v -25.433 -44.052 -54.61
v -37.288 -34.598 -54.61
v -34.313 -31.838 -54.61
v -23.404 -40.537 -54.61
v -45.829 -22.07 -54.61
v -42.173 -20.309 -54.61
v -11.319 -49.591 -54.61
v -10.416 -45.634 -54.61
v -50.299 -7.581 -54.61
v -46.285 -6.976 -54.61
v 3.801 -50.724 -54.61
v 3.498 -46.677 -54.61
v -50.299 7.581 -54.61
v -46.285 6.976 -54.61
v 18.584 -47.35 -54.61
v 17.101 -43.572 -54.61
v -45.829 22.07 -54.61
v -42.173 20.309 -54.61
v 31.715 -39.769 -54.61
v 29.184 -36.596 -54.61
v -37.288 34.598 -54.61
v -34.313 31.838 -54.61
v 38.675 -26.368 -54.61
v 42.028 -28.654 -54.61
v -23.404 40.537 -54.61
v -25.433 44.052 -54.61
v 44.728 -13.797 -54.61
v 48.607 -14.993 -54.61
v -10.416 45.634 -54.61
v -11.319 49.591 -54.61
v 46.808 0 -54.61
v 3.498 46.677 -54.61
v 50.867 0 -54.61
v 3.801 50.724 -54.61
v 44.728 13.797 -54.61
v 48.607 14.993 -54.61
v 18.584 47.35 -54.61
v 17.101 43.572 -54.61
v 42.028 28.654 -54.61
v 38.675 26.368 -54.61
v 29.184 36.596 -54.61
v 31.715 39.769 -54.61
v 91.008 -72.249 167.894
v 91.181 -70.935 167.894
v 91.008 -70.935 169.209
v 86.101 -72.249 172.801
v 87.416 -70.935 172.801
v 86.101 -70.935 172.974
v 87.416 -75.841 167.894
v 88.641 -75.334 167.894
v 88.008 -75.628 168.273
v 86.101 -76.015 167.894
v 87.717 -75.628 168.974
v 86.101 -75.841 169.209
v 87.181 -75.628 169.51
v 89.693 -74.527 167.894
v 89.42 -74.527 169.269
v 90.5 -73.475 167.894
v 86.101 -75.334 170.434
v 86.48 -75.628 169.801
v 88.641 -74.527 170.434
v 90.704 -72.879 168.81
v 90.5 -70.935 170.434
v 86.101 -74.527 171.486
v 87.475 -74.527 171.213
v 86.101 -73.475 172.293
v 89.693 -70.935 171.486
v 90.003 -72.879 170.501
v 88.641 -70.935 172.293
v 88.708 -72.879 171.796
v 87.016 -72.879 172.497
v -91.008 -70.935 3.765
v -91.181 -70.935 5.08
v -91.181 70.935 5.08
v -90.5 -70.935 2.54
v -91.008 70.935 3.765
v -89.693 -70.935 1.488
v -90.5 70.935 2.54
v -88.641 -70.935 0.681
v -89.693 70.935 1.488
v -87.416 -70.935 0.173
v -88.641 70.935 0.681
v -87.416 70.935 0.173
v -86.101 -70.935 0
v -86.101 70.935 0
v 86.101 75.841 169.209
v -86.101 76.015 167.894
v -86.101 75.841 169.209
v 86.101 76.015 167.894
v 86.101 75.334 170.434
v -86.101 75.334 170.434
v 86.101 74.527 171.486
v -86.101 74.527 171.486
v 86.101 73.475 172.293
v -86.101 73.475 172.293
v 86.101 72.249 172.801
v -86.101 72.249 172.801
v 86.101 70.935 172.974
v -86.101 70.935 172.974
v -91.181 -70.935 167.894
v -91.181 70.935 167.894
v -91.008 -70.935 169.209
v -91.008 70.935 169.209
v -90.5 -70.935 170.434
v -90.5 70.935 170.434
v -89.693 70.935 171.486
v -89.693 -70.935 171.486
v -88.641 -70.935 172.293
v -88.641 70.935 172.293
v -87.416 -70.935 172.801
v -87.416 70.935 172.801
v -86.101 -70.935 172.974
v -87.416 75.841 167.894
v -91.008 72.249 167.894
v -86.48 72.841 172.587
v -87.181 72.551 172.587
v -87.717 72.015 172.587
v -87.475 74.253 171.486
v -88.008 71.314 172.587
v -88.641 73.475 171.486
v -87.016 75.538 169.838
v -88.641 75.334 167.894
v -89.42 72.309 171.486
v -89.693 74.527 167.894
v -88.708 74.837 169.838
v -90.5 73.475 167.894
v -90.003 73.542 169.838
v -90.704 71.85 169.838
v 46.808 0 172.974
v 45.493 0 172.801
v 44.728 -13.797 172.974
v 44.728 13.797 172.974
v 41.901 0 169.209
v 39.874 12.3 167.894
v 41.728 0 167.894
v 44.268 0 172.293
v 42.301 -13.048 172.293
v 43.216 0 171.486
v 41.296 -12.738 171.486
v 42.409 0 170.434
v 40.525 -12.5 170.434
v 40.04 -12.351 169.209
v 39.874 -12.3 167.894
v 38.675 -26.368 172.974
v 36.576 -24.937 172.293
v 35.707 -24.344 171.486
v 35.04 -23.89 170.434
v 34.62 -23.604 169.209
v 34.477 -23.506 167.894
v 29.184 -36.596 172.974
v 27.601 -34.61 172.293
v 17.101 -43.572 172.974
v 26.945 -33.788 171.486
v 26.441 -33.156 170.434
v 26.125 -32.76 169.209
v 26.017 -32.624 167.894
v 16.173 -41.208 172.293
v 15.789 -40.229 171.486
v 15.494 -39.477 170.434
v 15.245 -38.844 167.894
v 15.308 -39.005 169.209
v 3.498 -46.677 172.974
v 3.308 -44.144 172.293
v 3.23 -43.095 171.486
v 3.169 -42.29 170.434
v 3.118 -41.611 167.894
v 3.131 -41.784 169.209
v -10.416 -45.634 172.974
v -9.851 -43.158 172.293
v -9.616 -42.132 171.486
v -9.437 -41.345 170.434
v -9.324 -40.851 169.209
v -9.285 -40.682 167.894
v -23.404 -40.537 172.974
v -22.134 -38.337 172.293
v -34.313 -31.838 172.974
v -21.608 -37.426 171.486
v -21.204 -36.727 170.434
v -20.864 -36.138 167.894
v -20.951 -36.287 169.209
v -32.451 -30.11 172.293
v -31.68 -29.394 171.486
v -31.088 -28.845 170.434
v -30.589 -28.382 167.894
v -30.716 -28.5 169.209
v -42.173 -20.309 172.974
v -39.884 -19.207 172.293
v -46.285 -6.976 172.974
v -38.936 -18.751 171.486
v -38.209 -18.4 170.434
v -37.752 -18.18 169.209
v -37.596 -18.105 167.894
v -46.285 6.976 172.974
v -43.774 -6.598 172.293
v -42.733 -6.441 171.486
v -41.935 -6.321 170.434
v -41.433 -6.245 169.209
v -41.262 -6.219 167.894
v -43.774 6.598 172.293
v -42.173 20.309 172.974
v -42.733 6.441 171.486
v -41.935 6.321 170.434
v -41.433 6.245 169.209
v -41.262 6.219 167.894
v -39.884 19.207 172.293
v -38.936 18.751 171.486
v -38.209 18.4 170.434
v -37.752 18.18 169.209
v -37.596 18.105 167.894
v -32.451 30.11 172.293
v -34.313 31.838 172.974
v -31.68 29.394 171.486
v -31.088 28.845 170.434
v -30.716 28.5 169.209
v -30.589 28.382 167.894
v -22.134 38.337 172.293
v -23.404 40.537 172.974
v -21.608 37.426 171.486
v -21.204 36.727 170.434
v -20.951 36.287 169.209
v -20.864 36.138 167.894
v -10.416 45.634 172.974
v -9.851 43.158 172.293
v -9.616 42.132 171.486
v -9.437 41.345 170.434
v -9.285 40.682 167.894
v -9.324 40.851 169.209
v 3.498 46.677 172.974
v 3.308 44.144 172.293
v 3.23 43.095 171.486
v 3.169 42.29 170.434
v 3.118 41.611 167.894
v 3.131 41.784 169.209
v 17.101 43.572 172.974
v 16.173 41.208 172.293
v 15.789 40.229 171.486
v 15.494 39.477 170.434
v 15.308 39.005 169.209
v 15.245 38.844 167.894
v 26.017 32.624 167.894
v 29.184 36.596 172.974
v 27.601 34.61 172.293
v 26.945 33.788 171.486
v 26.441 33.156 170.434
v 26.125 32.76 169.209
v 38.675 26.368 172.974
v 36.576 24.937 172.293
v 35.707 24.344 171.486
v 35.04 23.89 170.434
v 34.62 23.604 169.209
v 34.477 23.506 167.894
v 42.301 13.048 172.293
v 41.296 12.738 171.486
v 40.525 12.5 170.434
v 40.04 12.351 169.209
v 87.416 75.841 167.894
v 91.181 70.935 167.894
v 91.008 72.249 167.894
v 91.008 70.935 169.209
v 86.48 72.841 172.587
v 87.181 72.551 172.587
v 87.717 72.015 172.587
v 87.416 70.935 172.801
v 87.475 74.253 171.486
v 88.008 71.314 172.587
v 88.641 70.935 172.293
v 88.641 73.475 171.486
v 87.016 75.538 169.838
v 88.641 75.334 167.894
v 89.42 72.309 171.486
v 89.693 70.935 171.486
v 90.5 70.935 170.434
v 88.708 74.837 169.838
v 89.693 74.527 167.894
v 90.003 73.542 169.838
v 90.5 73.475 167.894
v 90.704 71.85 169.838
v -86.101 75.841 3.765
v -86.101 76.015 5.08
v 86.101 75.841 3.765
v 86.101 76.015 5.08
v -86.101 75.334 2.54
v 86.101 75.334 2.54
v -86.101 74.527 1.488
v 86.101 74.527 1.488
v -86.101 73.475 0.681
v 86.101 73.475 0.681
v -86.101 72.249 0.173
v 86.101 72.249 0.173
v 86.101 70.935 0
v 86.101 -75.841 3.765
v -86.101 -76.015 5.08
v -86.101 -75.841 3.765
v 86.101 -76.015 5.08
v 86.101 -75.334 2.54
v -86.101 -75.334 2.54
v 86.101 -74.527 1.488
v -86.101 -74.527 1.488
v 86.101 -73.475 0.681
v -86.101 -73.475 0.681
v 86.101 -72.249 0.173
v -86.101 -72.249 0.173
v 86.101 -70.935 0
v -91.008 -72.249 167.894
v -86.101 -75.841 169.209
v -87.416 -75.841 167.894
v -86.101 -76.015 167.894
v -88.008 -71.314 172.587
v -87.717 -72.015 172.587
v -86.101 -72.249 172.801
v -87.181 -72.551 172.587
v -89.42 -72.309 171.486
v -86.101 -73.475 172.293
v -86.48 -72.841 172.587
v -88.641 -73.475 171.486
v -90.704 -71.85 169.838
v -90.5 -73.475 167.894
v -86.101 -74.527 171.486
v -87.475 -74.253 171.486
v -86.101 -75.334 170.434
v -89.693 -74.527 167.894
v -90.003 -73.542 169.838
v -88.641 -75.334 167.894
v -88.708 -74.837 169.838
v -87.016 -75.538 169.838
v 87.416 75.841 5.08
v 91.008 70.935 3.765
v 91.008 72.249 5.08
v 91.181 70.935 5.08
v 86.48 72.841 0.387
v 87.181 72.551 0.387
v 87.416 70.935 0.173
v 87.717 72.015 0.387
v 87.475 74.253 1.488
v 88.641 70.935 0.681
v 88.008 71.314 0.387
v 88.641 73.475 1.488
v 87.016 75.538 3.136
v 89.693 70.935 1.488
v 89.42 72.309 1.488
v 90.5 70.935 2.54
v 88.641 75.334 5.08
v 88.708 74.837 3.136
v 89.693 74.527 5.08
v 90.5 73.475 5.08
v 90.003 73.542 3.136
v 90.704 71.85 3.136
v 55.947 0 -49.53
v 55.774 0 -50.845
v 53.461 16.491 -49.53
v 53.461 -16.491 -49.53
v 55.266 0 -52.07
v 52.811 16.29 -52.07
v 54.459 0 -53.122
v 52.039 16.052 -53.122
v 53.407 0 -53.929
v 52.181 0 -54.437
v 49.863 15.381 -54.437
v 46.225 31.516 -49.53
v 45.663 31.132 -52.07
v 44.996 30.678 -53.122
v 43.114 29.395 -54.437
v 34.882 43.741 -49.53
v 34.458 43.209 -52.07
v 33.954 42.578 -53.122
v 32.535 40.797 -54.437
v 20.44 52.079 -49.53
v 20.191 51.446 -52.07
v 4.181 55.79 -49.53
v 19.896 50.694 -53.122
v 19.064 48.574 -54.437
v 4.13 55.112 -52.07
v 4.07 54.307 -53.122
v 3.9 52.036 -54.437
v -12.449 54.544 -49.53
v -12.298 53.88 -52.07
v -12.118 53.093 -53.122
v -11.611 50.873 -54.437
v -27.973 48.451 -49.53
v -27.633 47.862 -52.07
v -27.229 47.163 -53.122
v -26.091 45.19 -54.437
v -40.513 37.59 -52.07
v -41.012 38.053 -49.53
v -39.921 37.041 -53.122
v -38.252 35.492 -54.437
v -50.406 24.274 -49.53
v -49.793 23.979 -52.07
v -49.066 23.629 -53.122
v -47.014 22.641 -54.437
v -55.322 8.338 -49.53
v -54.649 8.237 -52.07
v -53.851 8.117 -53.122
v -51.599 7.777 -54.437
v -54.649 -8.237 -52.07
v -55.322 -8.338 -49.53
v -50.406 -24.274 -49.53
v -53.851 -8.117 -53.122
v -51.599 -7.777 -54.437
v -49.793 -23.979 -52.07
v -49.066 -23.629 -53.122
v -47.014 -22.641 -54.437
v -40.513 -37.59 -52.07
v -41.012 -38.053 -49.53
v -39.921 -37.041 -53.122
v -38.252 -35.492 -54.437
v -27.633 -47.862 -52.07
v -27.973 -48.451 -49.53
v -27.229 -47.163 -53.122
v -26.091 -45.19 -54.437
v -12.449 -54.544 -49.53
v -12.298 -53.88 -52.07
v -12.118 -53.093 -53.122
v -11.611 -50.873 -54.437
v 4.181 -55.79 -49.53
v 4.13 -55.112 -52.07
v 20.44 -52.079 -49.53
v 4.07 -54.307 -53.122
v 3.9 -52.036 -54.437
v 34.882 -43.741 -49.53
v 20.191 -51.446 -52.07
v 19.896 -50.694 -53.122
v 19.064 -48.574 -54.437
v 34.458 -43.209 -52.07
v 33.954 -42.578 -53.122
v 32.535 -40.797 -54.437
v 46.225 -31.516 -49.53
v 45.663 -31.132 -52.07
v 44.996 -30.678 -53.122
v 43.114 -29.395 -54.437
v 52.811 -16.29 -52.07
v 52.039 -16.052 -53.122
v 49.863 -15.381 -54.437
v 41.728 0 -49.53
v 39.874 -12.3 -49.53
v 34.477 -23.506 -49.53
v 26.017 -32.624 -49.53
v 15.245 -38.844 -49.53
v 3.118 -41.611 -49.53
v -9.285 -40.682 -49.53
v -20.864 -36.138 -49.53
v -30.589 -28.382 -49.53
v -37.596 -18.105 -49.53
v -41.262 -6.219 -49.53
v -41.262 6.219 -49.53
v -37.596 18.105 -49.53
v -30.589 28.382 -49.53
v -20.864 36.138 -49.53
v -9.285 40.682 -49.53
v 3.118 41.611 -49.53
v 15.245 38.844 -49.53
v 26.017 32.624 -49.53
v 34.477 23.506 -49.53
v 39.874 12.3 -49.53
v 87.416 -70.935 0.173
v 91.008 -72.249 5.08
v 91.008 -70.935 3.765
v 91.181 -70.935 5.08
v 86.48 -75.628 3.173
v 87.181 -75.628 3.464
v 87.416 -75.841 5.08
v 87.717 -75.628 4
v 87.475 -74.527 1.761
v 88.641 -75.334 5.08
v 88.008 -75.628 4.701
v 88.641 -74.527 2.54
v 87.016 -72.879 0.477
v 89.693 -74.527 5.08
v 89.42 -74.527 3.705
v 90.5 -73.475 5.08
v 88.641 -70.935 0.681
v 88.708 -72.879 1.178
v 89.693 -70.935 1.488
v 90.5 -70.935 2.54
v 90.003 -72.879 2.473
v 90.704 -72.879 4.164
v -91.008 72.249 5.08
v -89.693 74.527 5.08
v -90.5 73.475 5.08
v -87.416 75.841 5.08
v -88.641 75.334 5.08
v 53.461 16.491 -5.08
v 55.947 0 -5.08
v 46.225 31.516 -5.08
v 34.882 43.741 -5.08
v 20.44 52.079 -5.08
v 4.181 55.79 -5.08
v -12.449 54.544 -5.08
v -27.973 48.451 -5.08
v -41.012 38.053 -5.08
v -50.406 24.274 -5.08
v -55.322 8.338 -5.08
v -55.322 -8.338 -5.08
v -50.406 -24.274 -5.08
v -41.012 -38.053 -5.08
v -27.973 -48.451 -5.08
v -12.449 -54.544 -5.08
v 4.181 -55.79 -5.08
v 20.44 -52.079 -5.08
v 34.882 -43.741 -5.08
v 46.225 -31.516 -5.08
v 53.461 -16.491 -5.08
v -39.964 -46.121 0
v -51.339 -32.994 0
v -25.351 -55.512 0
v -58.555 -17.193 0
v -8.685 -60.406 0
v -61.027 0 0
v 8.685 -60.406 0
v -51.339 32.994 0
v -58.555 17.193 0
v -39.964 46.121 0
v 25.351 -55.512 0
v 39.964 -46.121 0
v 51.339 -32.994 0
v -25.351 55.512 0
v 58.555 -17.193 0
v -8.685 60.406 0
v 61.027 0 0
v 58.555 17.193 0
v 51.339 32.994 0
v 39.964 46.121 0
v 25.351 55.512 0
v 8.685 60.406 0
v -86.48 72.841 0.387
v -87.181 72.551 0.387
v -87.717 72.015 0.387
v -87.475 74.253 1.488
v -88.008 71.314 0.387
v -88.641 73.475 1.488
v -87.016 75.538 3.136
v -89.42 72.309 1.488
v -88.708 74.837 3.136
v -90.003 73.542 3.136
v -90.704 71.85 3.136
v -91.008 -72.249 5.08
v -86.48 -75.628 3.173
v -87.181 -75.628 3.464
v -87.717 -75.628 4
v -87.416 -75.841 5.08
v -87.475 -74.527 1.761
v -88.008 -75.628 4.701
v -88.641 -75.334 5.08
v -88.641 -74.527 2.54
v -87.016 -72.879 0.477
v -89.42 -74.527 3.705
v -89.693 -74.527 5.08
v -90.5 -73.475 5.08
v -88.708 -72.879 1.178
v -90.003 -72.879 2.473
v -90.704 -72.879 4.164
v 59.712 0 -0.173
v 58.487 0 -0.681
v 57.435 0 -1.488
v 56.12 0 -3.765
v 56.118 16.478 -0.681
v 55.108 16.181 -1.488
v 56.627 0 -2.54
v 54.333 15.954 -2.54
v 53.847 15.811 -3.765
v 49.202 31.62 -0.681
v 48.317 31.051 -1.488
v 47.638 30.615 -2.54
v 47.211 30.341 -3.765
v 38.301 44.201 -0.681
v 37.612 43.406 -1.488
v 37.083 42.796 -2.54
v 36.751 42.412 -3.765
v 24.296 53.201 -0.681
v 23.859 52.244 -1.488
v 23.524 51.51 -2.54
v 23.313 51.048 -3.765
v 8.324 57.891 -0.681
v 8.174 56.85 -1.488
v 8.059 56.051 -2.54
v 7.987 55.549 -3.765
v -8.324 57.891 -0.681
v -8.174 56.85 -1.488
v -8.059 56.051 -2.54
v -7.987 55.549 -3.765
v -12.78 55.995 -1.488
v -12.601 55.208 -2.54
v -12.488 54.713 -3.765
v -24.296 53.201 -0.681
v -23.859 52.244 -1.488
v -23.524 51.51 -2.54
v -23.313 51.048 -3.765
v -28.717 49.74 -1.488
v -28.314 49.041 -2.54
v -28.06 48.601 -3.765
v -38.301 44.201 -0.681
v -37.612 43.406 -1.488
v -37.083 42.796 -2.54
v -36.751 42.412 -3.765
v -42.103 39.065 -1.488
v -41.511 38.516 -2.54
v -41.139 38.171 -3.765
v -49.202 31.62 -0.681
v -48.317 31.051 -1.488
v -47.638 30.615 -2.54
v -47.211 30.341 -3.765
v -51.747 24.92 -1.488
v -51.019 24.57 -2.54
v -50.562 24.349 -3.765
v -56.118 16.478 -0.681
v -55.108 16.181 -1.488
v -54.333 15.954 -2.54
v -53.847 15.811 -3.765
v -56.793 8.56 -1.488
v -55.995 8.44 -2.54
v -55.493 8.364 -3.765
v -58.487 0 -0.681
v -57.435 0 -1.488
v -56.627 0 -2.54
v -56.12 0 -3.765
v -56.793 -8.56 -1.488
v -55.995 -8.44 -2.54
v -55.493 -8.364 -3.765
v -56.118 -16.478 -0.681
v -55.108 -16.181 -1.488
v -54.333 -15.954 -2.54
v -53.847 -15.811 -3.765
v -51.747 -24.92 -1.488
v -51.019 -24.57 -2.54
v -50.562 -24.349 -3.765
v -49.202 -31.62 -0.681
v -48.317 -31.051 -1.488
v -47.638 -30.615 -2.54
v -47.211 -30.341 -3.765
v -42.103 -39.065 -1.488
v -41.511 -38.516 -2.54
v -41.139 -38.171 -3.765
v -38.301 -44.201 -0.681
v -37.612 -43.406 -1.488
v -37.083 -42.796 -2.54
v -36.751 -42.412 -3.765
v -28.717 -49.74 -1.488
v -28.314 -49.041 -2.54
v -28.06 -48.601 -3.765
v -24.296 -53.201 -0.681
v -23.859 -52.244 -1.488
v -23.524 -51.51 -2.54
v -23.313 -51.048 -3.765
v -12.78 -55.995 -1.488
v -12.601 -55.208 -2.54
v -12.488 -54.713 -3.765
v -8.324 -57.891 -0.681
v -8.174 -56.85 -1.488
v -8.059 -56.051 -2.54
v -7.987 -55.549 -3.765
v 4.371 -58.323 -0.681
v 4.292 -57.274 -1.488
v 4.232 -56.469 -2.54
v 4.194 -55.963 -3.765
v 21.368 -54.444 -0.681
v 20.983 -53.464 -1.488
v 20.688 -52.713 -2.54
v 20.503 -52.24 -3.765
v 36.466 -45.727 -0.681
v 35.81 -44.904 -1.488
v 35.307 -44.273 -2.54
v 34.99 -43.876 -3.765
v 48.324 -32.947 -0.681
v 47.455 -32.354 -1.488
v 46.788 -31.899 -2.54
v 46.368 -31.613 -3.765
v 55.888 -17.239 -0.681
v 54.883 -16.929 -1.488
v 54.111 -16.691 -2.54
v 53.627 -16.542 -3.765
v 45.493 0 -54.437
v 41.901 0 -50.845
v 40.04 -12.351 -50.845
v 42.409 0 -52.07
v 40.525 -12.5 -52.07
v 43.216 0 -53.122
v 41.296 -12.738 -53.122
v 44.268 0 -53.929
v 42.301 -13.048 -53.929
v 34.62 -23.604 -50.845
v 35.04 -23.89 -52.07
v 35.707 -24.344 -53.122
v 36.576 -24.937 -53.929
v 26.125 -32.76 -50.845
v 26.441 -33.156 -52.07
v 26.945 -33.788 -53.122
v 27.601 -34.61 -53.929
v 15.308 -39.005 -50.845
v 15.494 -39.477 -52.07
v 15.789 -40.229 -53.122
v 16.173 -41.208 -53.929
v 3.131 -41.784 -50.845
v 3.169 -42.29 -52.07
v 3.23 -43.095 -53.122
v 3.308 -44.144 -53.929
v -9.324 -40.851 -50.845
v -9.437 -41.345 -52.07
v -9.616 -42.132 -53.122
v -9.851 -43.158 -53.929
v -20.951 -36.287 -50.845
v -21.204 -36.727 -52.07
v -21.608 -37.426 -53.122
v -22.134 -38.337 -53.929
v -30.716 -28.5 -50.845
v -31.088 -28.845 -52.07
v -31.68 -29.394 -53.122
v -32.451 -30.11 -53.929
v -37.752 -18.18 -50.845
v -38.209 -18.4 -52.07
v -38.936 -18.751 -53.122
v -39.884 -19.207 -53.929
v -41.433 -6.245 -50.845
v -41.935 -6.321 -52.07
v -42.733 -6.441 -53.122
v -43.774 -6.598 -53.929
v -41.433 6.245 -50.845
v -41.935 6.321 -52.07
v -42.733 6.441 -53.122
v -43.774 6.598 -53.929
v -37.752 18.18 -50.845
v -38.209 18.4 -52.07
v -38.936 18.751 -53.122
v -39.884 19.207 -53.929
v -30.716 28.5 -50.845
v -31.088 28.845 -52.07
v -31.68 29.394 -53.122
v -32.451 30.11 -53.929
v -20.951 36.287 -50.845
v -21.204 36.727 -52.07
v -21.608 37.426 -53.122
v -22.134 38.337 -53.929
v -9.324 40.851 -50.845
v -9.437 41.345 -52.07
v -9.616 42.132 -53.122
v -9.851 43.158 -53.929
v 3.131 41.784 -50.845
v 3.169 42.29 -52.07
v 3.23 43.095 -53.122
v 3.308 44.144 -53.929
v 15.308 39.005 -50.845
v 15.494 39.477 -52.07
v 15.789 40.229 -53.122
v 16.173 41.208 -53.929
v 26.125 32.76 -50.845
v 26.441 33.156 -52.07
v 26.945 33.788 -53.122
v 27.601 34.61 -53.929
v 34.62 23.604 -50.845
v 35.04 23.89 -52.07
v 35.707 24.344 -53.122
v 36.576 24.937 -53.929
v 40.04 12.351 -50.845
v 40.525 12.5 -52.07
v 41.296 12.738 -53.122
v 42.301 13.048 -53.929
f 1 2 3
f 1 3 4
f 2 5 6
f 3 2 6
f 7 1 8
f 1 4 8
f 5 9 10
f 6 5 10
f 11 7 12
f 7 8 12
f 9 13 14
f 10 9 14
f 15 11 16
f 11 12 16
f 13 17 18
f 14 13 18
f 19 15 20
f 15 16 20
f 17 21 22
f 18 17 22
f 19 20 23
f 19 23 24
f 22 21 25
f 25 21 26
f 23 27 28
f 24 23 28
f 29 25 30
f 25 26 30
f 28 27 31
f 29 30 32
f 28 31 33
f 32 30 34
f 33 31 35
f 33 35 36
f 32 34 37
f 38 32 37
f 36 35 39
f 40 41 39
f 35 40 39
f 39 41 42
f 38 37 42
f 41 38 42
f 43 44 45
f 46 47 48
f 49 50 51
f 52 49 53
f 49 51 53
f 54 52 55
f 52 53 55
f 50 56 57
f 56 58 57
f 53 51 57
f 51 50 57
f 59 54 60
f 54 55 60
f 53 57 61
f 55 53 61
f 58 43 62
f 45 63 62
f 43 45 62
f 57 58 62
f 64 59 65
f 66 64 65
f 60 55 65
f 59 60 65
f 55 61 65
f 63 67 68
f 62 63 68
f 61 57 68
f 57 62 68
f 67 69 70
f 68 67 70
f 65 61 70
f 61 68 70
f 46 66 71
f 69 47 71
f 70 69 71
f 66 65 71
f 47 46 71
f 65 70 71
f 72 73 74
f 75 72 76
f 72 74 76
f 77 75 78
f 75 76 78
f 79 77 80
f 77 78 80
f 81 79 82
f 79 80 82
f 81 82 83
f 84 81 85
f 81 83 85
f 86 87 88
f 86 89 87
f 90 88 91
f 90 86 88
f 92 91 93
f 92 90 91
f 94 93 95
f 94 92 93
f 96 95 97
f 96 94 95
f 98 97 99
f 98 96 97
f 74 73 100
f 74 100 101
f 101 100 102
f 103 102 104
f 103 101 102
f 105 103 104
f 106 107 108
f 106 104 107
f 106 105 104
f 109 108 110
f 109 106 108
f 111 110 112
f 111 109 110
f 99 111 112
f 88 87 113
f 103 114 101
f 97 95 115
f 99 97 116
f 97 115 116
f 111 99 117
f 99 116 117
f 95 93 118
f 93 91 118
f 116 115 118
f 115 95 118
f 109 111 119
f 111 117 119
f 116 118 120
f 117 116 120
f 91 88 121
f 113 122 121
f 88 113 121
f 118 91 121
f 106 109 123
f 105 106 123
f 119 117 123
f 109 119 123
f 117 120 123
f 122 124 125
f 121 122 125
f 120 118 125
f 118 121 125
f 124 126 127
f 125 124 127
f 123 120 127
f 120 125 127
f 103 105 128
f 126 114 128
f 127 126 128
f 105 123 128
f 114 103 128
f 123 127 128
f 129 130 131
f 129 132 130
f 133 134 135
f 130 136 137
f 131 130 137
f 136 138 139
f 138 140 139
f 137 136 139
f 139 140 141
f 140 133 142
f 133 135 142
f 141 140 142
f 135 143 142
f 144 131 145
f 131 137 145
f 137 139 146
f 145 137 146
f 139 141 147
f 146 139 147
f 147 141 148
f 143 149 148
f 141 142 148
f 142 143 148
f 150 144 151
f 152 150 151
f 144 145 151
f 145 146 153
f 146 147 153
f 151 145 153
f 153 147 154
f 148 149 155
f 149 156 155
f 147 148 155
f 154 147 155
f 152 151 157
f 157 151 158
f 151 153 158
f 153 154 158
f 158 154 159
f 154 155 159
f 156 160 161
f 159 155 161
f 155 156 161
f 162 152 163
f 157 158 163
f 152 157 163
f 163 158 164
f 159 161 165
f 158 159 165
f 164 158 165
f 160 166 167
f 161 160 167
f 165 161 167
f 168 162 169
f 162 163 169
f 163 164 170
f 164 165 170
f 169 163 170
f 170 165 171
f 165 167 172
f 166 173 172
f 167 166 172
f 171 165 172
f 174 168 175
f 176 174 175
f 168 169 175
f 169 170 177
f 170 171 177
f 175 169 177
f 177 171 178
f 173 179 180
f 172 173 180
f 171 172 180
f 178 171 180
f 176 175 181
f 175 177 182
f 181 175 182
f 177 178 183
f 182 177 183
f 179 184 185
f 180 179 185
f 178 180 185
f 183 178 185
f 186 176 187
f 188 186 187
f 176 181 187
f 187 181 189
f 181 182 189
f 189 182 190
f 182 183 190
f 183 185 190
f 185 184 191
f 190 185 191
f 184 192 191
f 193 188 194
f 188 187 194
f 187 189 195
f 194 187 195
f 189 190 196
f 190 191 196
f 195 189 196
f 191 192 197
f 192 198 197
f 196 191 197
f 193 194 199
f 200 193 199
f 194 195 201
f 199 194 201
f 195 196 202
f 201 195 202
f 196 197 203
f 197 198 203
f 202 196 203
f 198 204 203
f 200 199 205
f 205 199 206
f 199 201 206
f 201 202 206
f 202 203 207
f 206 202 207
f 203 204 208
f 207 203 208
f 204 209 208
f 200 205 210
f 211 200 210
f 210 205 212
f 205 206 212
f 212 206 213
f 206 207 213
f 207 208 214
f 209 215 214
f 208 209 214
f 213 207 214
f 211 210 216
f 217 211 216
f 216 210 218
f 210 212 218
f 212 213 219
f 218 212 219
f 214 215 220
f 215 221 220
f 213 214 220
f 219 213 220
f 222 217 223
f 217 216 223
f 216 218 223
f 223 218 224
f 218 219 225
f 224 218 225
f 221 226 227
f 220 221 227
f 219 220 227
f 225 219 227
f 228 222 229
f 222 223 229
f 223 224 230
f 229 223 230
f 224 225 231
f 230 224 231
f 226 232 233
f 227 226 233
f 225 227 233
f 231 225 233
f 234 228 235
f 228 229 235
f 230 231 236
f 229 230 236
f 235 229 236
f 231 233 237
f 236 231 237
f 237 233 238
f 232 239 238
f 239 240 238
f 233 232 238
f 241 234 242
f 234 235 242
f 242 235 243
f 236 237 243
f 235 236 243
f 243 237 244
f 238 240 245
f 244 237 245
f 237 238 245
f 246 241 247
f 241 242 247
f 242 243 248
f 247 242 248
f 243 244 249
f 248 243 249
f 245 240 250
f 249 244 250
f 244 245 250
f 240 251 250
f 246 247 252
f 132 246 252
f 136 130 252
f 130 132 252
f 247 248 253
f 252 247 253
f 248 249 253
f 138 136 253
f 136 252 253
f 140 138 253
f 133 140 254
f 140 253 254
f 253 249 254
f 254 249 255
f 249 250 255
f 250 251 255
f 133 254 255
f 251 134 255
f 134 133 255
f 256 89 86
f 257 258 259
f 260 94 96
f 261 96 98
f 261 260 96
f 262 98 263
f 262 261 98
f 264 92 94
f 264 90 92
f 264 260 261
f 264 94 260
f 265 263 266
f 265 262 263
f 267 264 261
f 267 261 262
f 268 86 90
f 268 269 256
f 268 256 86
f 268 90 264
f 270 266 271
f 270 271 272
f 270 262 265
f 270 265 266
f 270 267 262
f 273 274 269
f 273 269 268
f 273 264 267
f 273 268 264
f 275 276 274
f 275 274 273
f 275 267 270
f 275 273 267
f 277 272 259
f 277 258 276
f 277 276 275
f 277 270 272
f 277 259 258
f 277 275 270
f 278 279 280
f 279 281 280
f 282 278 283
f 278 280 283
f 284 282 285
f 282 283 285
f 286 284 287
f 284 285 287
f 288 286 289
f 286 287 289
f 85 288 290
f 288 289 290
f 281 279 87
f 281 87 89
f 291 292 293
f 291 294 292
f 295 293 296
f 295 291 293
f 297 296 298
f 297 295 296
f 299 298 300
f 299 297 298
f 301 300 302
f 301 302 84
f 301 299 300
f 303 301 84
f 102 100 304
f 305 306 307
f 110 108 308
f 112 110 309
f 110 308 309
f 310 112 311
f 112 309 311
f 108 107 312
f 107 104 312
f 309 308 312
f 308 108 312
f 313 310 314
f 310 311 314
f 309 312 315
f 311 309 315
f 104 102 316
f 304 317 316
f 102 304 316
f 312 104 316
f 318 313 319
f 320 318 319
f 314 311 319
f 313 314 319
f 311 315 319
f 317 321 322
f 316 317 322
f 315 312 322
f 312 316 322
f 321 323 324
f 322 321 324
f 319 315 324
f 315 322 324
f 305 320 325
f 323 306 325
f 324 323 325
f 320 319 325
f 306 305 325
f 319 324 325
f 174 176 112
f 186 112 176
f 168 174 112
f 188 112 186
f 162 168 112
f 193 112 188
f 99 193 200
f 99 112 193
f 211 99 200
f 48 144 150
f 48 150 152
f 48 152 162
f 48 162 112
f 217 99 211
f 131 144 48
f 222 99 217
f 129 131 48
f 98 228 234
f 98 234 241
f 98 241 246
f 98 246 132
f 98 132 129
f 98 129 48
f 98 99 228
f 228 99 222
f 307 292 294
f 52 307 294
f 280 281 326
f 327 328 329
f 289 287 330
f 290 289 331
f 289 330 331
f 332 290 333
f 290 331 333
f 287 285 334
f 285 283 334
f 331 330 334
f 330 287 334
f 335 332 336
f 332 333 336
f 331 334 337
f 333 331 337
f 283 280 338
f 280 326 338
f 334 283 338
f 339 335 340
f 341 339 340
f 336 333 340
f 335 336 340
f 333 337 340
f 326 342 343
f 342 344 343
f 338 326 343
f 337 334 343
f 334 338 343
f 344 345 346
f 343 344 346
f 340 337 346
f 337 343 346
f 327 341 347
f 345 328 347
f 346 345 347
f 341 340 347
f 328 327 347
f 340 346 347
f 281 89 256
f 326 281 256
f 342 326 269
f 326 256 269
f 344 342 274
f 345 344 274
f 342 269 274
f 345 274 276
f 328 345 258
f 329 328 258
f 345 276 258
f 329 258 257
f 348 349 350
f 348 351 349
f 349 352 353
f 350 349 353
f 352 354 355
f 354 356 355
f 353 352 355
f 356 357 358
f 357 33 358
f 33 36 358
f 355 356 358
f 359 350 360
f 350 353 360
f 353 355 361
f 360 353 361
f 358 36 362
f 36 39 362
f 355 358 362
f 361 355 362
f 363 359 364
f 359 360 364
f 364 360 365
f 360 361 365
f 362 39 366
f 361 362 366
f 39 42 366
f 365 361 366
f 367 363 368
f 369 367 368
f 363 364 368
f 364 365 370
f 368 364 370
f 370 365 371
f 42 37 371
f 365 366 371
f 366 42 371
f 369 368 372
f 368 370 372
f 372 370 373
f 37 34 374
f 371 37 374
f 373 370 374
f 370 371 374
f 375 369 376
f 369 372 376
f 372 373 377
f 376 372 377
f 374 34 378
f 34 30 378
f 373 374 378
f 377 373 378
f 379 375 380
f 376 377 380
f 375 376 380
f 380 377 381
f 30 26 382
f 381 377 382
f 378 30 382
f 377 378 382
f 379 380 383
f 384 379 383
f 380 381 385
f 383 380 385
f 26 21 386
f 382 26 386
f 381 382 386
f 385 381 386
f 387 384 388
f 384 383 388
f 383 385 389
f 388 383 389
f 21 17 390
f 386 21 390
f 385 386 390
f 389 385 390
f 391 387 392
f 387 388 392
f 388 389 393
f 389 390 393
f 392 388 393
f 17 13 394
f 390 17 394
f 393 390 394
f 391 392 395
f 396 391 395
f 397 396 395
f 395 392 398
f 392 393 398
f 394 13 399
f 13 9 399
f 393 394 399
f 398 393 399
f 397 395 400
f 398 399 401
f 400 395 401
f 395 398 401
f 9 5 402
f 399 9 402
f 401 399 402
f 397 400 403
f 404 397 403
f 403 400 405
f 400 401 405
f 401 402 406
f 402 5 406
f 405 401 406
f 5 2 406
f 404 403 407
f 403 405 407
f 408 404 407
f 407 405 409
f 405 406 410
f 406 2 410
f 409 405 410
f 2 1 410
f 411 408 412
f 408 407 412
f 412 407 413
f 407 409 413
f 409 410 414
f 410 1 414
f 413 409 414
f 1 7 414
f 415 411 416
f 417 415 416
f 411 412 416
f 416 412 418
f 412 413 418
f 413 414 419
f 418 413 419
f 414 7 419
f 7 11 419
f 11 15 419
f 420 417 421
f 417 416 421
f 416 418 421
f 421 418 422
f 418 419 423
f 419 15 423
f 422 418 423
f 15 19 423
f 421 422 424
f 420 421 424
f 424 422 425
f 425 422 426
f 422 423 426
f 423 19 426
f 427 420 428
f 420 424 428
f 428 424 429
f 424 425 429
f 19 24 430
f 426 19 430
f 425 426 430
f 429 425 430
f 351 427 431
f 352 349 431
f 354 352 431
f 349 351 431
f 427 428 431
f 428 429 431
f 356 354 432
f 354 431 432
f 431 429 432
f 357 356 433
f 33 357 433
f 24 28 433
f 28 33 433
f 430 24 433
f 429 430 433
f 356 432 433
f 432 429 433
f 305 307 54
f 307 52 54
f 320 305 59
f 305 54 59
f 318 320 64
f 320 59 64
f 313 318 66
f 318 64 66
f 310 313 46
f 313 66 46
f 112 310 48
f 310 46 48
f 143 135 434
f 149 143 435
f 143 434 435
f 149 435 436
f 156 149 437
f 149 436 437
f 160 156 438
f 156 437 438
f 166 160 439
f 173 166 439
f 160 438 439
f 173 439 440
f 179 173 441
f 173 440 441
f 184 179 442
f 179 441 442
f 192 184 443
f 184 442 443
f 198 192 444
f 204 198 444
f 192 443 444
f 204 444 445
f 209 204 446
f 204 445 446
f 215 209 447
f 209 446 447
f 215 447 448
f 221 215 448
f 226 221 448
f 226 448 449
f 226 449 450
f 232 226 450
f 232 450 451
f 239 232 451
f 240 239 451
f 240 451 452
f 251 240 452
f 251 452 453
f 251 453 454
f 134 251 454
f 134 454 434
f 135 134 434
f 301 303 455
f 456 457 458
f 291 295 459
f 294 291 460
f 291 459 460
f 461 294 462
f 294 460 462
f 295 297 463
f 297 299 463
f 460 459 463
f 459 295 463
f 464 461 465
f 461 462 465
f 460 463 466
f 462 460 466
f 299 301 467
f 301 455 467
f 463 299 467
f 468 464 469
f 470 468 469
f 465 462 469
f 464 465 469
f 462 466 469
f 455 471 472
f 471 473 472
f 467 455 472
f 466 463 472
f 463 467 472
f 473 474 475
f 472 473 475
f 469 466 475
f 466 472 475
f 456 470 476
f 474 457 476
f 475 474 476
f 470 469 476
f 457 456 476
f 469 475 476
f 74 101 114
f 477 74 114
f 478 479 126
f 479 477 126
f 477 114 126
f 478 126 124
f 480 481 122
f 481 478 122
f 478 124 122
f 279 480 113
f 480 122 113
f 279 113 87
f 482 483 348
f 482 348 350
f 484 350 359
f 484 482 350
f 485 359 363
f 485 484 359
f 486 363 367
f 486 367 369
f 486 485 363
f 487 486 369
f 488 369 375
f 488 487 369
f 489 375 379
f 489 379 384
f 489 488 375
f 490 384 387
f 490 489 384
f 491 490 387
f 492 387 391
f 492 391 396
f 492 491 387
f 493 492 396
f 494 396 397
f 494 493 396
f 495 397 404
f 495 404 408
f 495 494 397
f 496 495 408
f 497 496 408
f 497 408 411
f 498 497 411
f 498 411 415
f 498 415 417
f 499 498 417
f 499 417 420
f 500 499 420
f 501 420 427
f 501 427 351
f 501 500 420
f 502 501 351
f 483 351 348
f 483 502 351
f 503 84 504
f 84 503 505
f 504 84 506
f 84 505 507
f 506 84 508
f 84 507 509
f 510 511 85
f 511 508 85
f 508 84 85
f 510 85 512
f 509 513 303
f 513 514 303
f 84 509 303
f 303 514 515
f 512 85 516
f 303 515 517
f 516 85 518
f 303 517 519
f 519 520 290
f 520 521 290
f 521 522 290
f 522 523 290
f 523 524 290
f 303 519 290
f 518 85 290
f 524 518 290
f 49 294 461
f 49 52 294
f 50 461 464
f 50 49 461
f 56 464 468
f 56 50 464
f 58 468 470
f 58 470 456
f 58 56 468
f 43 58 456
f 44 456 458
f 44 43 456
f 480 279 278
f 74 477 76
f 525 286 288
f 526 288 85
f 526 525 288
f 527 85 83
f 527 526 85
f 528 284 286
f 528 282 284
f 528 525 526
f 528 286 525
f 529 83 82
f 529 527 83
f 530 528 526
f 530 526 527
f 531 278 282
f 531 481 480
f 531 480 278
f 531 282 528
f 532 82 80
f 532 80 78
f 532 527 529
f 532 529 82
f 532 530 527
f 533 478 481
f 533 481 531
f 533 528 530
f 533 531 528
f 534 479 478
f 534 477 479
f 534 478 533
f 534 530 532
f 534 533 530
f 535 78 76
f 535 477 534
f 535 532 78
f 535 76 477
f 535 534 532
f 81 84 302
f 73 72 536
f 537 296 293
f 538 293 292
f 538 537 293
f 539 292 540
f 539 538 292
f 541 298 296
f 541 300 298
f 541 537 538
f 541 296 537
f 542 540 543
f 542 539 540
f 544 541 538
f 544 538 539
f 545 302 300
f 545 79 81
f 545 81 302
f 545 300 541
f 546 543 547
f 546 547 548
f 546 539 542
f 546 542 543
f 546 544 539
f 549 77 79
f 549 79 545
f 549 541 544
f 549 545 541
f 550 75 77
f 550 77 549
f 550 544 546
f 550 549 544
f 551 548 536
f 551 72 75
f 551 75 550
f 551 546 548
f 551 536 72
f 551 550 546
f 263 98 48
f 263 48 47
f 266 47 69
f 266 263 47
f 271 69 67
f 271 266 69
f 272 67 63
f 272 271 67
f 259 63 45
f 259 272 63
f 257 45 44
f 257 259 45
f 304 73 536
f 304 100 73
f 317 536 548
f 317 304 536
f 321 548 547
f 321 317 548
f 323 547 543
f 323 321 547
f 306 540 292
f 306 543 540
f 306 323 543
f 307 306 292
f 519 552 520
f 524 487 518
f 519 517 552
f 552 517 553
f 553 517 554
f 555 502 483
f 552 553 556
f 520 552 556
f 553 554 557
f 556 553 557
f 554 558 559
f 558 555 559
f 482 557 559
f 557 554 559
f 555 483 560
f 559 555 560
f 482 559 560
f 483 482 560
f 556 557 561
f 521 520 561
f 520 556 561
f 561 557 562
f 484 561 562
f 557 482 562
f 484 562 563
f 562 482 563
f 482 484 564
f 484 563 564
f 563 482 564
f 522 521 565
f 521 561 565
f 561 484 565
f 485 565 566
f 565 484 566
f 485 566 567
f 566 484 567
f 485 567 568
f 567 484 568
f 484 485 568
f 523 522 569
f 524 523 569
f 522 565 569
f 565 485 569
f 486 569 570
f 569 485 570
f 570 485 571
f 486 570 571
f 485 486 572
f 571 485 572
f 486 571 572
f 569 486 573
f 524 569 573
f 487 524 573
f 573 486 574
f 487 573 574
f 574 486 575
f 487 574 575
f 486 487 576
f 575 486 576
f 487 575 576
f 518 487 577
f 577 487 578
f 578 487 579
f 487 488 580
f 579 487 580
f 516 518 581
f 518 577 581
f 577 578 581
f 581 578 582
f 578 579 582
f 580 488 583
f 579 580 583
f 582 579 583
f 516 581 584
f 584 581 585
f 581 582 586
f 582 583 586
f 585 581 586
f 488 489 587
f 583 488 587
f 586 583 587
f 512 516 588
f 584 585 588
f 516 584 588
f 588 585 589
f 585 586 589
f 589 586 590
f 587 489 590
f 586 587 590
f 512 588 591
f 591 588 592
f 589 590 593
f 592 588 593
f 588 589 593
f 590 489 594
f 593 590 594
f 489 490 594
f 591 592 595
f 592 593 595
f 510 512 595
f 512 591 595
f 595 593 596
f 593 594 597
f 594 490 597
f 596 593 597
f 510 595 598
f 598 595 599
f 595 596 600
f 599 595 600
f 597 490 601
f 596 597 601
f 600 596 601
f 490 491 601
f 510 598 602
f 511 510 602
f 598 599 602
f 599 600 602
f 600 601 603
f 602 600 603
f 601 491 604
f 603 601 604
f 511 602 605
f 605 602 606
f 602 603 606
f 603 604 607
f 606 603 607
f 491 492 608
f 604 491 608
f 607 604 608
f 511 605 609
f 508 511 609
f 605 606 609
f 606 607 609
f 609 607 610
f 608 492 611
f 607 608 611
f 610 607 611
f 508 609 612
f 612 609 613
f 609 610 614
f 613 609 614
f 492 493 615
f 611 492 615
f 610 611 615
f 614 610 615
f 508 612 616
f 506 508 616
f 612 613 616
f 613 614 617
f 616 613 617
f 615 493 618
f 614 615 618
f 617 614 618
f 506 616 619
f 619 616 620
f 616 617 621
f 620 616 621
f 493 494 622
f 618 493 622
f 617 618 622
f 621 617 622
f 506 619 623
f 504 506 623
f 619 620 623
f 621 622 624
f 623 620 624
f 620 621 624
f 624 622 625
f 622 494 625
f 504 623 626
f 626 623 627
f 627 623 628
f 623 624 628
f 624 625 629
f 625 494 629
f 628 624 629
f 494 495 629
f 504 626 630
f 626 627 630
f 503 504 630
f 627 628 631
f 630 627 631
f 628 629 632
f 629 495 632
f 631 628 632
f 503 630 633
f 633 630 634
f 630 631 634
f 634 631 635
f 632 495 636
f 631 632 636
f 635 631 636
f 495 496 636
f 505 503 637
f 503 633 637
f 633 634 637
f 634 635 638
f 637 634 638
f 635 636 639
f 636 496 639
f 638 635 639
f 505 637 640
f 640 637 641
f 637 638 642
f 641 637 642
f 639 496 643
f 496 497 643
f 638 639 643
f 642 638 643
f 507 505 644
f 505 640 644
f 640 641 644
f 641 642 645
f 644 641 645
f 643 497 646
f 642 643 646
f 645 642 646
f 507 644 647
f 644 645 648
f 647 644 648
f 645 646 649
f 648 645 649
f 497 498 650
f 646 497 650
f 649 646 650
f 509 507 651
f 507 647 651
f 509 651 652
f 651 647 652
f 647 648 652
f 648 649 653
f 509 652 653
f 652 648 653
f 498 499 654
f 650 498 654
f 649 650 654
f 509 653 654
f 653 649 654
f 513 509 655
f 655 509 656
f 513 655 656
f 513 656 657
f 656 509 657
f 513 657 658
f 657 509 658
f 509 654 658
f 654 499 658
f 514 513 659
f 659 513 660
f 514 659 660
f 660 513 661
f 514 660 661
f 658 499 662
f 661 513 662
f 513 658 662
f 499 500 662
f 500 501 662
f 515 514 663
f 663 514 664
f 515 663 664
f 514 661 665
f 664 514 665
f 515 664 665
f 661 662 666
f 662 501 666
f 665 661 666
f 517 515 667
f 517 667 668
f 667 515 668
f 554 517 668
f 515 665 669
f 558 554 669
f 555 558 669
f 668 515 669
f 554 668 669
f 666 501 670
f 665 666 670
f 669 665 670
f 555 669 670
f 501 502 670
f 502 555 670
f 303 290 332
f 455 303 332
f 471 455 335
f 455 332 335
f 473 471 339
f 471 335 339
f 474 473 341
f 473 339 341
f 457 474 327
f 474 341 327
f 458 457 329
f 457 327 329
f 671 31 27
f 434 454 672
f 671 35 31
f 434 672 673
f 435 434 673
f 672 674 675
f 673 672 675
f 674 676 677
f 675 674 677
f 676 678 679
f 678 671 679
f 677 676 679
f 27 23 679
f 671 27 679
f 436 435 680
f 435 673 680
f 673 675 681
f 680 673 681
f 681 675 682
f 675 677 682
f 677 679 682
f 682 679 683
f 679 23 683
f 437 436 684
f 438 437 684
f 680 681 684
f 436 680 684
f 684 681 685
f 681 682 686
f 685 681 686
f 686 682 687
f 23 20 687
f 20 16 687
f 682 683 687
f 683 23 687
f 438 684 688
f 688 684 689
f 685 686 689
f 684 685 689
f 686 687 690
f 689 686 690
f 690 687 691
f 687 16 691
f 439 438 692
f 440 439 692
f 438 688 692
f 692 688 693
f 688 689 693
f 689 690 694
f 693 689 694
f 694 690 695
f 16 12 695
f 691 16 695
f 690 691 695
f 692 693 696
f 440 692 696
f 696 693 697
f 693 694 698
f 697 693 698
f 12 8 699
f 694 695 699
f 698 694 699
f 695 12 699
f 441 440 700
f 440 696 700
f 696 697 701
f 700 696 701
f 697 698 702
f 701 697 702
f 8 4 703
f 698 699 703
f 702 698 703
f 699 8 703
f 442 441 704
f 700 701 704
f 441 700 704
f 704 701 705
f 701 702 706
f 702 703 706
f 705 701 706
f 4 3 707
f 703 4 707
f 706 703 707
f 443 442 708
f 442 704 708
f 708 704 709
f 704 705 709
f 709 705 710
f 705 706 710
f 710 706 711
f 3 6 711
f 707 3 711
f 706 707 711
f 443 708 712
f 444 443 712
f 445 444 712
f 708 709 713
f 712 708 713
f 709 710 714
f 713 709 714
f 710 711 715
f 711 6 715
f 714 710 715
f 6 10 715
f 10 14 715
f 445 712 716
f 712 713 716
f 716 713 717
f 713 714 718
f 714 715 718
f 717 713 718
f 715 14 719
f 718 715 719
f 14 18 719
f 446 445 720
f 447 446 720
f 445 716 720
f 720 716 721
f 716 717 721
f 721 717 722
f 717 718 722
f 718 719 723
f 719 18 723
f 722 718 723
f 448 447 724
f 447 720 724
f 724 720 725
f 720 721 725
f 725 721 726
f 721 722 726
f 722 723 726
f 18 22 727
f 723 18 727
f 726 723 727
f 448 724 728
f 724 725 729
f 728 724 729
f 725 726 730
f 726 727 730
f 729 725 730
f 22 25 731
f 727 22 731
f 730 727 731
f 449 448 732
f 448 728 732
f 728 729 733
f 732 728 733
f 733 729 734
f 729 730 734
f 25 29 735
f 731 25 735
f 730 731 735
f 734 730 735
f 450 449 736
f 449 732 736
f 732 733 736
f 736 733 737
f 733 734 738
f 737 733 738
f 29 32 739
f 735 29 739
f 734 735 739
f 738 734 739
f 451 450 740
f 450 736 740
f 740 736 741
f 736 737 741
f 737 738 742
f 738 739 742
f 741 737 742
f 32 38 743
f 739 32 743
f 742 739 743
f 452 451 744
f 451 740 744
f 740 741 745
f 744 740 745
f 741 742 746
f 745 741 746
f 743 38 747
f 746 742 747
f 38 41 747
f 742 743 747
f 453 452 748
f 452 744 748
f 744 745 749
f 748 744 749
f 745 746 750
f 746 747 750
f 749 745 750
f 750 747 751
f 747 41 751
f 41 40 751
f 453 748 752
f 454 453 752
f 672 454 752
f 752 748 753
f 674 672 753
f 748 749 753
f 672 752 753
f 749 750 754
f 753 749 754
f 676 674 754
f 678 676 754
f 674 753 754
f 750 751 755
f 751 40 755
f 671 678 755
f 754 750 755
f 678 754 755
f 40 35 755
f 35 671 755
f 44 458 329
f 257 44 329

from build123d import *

# Parameters (mm, degrees)
F0_W     = 182.3617219925
F0_H     = 152.0290374756
F1_DEPTH = 172.974
F2_R     = 55.9466772096
F3_DEPTH = 54.61
F4_R     = 41.7280141722
F5_DEPTH = 271.272
F6_R     = 5.08


with BuildPart() as f1:
    # F0 (on Top) → F1 (new body)
    with BuildSketch(Plane.XY):
        Rectangle(F0_W, F0_H)
    extrude(amount=F1_DEPTH)

    # F2 (on Top) → F3 (join)
    with BuildSketch(Plane.XY):
        Circle(F2_R)
    extrude(amount=-F3_DEPTH)

    # F4 (on face) → F5 (cut)
    with BuildSketch(Plane(origin=(0, 0, -54.61), x_dir=(1, 0, 0), z_dir=(0, 0, -1))):
        Circle(F4_R)
    extrude(amount=-F5_DEPTH, mode=Mode.SUBTRACT)

    # F6
    f6_edges = [f1.edges().sort_by_distance(p)[0] for p in [
        (91.180861, 76.014519, 86.487),
        (-91.180861, 76.014519, 86.487),
        (0, 76.014519, 0),
        (0, 76.014519, 172.974),
        (91.180861, 0, 0),
        (-91.180861, 0, 0),
        (0, -76.014519, 0),
        (-55.946677, 0, 0),
        (-91.180861, -76.014519, 86.487),
        (-91.180861, 0, 172.974),
        (55.946677, 0, -27.305),
        (-55.946677, 0, -54.61),
        (-41.728014, 0, -54.61),
        (41.728014, 0, 59.182),
        (-41.728014, 0, 172.974),
        (91.180861, 0, 172.974),
        (91.180861, -76.014519, 86.487),
        (0, -76.014519, 172.974),
    ]]
    fillet(f6_edges, radius=F6_R)


solid = f1.part
